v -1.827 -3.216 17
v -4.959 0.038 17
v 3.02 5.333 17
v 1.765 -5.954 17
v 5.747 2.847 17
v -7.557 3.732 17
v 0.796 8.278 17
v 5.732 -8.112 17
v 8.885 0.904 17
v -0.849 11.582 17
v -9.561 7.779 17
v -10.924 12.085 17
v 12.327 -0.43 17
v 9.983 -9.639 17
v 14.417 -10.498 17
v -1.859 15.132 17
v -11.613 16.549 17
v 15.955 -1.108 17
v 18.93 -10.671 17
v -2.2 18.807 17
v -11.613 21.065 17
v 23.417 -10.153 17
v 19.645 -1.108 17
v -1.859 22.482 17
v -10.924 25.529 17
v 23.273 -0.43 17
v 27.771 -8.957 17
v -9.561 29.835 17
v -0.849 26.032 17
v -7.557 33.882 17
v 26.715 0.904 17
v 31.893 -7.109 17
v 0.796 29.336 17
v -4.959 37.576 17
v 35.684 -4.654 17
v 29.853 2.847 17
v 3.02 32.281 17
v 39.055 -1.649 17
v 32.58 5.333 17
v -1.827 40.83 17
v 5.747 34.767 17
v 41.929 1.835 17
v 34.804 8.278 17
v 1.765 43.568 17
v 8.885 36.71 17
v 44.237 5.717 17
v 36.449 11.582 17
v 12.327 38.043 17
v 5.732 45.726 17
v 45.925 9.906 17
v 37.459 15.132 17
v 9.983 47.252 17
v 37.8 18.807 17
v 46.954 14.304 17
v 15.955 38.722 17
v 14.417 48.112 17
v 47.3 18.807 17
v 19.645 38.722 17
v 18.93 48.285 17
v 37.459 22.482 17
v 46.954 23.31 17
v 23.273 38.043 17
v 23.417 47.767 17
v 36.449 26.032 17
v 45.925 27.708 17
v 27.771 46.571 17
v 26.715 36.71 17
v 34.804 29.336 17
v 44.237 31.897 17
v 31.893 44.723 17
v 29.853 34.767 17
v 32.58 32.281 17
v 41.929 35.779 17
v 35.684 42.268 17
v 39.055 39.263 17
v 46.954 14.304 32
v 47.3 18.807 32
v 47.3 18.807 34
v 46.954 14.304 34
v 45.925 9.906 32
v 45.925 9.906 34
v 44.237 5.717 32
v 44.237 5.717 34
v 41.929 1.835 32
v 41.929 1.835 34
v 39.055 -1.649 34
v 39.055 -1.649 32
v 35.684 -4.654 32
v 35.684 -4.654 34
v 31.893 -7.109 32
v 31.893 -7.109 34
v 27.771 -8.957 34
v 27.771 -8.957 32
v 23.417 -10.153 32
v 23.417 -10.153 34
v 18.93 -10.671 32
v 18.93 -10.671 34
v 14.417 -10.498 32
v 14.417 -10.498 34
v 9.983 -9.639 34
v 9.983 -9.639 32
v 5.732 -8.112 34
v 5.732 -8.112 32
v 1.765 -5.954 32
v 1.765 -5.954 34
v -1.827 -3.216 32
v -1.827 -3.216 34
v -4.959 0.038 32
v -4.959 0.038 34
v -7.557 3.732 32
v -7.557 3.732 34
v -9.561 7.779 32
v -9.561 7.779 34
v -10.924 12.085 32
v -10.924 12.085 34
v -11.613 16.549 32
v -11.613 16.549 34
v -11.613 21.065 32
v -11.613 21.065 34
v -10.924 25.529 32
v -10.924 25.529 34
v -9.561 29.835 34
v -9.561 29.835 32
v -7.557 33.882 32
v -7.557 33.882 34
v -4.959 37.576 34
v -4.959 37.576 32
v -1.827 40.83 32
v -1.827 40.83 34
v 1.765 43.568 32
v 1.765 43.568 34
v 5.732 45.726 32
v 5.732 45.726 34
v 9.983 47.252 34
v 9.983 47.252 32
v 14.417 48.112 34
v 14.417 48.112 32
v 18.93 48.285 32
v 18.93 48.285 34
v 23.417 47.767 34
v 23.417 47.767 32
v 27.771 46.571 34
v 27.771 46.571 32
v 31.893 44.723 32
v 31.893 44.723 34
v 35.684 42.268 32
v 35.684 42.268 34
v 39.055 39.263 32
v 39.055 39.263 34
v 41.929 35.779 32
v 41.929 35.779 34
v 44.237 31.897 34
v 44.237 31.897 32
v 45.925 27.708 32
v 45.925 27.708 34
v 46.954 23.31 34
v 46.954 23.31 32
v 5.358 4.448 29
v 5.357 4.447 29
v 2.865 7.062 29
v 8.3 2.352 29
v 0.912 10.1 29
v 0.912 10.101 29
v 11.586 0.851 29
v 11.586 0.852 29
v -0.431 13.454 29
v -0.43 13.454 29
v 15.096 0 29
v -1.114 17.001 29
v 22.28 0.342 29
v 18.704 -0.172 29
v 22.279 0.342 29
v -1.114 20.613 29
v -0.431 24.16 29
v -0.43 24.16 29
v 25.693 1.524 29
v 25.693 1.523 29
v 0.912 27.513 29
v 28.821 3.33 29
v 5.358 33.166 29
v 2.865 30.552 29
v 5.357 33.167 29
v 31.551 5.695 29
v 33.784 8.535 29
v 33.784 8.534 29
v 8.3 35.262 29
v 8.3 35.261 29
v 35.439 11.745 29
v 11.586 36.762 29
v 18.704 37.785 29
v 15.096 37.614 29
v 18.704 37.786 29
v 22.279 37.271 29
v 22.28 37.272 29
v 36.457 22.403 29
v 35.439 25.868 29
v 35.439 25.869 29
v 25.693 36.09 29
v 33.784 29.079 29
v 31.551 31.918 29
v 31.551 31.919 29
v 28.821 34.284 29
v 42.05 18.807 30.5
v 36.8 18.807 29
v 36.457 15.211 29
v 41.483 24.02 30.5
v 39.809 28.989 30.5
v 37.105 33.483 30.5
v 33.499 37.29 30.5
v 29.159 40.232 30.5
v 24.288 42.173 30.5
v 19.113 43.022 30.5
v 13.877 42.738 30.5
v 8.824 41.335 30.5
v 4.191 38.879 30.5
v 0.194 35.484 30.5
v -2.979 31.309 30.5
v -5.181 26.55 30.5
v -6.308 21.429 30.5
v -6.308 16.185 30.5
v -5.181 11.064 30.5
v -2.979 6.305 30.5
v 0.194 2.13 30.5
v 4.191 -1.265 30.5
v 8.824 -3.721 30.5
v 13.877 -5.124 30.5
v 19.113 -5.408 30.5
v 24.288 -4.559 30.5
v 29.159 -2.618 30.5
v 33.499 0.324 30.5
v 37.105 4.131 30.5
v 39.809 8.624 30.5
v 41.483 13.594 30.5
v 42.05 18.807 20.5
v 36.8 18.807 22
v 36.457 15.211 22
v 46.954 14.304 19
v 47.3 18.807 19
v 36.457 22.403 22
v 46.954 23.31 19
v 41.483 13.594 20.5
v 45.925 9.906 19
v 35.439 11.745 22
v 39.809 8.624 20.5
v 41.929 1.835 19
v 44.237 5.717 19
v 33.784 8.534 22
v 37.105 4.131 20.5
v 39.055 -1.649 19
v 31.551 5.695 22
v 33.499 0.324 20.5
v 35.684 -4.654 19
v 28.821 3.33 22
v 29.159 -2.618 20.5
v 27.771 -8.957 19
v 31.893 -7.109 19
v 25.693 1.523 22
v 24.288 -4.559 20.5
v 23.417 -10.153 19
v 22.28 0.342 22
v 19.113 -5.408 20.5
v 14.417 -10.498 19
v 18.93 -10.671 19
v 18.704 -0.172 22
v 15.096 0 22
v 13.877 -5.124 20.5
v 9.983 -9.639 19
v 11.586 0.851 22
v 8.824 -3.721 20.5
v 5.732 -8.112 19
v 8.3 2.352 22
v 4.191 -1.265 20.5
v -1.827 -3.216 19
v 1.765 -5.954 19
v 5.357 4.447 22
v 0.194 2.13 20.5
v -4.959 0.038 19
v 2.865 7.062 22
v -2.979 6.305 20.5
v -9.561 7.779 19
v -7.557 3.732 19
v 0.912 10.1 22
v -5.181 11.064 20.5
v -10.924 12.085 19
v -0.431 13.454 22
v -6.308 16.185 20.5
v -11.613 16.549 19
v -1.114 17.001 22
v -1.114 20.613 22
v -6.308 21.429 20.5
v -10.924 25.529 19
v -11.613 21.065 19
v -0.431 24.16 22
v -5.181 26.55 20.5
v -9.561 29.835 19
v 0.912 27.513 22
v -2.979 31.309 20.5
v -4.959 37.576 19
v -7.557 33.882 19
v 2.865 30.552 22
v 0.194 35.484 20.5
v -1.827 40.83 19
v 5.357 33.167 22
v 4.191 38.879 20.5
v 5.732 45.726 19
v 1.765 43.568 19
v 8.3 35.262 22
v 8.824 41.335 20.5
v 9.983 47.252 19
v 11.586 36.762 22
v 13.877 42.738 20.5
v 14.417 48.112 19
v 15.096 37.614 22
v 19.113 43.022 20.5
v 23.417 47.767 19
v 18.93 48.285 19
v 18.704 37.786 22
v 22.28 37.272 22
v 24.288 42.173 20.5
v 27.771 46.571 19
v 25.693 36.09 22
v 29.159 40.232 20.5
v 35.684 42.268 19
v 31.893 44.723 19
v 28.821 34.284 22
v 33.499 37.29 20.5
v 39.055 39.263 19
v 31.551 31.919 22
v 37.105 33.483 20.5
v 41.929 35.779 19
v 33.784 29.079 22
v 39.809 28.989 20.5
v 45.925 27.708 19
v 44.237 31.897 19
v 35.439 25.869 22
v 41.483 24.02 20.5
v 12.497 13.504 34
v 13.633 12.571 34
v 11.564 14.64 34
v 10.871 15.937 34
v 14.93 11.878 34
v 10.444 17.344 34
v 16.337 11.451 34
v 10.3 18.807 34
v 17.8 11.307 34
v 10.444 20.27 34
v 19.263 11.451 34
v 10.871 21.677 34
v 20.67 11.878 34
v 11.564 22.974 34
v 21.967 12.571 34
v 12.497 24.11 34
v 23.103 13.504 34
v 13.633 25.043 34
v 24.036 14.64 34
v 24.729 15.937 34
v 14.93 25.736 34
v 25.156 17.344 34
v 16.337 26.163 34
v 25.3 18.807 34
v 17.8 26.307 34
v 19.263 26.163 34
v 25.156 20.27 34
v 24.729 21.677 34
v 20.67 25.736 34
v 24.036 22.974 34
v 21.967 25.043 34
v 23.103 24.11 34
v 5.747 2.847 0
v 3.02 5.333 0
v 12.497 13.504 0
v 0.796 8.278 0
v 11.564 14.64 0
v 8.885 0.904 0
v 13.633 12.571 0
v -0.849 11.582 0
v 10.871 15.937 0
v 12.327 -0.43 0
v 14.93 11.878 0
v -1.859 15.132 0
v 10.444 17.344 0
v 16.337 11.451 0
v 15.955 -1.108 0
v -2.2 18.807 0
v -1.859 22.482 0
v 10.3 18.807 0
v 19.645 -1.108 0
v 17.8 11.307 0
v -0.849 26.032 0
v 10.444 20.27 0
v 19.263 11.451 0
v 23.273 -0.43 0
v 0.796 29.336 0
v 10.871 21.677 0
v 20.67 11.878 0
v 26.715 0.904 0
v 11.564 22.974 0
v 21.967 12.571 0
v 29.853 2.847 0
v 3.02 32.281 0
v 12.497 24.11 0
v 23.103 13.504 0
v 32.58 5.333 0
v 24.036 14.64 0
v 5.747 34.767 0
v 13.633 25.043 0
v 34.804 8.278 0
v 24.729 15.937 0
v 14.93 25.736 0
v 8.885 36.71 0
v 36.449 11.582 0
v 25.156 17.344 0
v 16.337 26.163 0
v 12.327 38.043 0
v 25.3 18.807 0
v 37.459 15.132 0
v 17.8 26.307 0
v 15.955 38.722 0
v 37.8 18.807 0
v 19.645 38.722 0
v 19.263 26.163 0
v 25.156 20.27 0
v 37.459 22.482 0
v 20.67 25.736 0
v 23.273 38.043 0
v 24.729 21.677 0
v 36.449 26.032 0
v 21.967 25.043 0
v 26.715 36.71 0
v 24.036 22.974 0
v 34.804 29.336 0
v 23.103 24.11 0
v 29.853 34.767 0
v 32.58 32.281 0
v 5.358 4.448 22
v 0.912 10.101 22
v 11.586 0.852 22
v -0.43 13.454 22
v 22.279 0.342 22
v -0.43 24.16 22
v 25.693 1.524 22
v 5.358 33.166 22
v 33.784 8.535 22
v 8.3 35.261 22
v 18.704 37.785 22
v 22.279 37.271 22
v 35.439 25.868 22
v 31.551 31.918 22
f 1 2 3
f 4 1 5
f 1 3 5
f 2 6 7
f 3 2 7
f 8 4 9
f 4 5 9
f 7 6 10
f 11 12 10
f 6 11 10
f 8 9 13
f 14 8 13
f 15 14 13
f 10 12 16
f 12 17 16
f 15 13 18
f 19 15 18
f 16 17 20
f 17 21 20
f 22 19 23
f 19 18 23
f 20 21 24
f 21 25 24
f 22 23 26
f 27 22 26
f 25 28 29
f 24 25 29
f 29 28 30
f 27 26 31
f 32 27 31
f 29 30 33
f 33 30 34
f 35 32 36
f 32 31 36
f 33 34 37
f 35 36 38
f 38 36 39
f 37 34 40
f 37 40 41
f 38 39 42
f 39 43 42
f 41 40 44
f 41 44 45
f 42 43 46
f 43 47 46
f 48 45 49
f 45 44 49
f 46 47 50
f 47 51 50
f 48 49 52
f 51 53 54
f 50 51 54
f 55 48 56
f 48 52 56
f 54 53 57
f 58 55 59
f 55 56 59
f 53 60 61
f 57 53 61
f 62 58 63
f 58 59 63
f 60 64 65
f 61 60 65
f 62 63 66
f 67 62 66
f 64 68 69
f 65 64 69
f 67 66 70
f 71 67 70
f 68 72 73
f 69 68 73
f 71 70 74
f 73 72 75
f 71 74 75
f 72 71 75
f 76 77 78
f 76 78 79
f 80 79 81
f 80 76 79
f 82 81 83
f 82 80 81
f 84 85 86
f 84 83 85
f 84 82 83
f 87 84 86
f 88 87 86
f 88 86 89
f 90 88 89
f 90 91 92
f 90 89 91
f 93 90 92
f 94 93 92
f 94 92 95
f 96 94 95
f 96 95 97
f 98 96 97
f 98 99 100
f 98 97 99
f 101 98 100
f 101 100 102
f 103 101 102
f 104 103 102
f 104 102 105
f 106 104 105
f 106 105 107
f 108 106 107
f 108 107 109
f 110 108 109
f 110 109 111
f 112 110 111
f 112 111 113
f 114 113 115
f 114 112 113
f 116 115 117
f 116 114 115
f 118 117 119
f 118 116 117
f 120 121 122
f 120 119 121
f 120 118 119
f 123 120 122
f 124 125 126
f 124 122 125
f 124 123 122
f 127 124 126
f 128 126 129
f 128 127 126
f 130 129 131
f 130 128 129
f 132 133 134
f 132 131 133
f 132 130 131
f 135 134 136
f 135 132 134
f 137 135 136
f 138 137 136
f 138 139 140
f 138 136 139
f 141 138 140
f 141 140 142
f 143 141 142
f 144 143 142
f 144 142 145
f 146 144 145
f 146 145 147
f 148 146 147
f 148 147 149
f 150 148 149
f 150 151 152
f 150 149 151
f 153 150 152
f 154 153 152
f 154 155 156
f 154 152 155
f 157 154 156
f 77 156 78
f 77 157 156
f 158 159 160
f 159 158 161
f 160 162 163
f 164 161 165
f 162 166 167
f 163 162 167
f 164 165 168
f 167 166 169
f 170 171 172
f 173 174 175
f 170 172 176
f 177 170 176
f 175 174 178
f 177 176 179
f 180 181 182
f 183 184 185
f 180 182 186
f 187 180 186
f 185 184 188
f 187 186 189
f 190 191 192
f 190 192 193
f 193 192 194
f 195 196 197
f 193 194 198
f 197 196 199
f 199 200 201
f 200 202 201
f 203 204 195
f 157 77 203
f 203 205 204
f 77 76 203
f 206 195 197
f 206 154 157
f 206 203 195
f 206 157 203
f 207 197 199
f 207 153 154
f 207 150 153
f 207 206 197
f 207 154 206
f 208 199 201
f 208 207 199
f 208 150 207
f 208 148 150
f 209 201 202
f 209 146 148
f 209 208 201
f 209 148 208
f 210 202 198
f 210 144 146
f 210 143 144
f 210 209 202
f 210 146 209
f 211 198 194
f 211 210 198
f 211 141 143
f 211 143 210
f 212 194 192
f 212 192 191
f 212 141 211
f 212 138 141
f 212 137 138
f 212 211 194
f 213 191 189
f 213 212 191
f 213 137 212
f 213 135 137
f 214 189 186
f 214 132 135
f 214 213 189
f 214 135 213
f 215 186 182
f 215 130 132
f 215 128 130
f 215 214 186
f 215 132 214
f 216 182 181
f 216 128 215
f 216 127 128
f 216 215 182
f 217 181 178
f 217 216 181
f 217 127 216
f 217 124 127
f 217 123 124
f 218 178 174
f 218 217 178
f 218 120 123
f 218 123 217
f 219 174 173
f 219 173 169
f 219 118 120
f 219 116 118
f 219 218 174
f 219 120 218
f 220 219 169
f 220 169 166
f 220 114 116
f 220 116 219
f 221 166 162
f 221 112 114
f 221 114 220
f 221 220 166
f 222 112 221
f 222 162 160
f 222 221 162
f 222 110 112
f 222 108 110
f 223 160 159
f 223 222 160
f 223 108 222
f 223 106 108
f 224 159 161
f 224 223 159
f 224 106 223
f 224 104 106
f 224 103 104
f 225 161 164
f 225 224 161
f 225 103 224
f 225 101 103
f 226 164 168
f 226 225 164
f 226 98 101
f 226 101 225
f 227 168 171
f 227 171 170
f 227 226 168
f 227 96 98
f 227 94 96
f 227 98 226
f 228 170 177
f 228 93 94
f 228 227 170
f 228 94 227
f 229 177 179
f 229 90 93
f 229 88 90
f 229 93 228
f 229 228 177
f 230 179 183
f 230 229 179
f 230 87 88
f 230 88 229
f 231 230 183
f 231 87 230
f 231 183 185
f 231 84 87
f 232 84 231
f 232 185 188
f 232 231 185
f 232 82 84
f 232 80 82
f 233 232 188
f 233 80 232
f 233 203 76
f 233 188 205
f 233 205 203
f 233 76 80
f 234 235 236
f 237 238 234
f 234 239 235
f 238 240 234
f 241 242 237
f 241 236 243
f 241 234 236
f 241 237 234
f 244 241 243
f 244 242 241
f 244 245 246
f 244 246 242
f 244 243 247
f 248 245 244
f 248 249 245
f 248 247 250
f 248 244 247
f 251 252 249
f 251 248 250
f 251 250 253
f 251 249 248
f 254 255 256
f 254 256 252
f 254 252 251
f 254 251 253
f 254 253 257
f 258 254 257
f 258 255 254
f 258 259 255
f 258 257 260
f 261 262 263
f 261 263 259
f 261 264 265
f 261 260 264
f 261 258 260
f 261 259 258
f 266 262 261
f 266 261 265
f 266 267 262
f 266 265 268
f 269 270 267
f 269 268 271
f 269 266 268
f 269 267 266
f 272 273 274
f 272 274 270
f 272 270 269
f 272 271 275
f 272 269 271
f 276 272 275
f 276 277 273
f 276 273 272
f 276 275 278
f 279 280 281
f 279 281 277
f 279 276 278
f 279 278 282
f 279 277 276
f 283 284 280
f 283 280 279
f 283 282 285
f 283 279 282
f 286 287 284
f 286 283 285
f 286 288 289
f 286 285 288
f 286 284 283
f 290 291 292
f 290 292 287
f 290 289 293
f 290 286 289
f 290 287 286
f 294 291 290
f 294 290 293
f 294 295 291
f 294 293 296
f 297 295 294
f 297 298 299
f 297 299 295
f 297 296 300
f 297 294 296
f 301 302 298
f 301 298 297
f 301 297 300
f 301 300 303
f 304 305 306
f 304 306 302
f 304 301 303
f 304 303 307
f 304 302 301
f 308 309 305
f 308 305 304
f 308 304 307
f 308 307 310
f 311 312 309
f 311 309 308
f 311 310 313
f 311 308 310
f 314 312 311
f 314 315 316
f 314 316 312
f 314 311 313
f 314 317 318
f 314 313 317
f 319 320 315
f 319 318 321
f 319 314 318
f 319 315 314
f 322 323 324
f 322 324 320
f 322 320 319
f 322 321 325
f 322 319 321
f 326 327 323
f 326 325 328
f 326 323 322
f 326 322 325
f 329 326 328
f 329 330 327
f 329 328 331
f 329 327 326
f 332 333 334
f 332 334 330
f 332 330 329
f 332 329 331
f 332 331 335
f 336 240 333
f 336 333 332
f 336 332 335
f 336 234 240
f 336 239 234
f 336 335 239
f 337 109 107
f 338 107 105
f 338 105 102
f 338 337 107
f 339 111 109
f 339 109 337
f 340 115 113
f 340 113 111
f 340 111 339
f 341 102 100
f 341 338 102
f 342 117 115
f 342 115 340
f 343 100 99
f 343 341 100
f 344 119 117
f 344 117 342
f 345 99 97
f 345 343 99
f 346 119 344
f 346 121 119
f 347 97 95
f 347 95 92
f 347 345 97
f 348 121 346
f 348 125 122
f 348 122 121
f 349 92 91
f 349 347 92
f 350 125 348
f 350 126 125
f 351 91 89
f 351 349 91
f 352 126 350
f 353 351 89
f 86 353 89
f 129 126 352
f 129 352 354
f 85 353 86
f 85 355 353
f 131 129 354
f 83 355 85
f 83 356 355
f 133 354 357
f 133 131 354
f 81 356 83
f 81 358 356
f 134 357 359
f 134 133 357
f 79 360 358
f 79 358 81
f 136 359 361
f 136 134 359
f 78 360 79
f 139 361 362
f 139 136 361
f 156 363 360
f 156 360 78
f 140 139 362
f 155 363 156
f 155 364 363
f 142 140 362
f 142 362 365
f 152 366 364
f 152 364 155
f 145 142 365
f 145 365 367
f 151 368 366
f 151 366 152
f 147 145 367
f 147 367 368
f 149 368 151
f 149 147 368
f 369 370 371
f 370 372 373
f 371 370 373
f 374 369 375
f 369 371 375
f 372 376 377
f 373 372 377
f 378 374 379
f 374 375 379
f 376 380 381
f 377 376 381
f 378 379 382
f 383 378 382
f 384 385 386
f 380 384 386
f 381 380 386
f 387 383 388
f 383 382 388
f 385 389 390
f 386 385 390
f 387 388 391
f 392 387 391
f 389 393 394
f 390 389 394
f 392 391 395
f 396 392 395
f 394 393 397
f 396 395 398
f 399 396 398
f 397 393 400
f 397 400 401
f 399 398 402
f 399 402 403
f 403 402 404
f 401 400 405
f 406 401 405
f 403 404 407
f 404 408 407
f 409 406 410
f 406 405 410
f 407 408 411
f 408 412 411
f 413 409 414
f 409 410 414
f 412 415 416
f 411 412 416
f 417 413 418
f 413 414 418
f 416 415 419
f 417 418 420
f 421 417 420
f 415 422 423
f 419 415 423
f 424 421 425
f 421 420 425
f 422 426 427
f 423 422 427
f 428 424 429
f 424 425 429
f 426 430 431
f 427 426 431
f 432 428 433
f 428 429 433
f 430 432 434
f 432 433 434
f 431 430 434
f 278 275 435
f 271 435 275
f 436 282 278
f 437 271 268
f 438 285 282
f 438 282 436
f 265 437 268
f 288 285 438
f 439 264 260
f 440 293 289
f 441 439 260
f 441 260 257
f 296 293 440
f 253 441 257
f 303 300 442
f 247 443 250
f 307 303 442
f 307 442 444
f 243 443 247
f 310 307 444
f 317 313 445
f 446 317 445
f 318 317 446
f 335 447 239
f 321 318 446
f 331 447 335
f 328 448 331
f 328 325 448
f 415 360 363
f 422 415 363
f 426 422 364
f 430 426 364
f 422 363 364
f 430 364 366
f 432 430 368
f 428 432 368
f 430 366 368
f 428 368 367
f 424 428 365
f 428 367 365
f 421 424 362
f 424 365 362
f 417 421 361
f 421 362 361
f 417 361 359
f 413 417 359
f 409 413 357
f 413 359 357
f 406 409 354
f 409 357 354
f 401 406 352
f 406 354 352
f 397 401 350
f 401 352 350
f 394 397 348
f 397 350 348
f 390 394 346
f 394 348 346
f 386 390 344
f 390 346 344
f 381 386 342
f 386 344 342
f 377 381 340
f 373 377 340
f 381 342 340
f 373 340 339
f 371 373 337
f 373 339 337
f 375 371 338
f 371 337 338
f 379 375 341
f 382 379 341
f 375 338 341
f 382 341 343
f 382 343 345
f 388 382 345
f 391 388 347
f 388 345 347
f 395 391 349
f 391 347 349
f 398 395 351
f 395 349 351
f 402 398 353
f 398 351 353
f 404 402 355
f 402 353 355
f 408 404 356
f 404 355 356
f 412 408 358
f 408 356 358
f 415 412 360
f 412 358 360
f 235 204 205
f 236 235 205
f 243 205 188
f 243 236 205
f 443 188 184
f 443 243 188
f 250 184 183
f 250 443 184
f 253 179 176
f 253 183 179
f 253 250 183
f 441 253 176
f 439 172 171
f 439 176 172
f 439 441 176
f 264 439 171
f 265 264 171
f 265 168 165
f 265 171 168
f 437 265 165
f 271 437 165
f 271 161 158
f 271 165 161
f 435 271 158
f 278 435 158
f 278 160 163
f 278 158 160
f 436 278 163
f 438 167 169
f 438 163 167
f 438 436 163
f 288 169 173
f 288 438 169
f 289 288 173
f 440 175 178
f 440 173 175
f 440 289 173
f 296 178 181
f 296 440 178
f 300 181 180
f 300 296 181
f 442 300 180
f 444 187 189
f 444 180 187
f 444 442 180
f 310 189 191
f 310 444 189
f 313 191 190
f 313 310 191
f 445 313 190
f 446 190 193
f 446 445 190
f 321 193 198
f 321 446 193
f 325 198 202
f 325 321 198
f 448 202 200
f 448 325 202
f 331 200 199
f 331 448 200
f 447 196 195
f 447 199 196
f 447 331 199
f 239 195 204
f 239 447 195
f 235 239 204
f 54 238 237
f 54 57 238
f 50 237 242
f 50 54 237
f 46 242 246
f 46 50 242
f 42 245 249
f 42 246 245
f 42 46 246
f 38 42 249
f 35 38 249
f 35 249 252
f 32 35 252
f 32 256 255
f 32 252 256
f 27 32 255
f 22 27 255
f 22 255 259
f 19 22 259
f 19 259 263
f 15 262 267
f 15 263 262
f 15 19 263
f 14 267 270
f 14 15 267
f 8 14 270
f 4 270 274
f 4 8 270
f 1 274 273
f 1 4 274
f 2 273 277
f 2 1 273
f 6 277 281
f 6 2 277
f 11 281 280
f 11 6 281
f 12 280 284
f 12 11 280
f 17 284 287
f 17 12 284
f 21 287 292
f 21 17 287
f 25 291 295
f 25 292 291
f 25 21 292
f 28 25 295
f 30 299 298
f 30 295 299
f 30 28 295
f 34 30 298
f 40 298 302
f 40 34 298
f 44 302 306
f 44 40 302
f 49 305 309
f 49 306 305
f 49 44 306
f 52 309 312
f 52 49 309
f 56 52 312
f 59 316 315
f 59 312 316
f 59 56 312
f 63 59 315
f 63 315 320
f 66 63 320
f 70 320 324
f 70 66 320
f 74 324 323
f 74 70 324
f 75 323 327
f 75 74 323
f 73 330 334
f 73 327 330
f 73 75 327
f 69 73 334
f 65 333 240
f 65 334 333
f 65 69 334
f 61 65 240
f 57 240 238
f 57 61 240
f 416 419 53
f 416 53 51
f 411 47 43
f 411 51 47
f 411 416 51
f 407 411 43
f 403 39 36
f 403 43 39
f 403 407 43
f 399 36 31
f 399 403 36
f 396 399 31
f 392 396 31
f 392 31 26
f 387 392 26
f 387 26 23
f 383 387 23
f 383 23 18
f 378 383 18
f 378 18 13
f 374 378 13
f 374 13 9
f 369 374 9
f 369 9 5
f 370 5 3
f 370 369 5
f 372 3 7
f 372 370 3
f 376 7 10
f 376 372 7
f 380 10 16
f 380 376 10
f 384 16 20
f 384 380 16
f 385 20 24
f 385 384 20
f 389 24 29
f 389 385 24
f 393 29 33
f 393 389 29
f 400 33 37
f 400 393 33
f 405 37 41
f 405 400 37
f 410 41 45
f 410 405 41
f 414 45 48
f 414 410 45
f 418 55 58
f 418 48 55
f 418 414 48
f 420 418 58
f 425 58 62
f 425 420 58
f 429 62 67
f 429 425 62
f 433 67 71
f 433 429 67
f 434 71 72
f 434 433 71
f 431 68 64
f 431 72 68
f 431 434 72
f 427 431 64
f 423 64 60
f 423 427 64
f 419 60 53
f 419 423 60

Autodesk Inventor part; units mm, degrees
ref_plane "YZ Plane" through (0, 0, 0) normal (1, 0, 0) x (0, 1, 0)
ref_plane "XZ Plane" through (0, 0, 0) normal (0, 1, 0) x (-1, 0, 0)
ref_plane "XY Plane" through (0, 0, 0) normal (0, 0, 1) x (1, 0, 0)
sketch "Sketch1" plane through (0, 0, 0) normal (0, 0, 1) x (1, 0, 0)
  circle A0 centre (17.8, 18.8069) radius 20
  circle A1 centre (17.8, 18.8069) radius 7.5
  point P0 (0, 0)
  dimension "d0" = 40
  dimension "d1" = 15
extrude "Extrusion1" add sketch "Sketch1" along normal blind 17
sketch "Sketch2" plane through (17.8, 18.8069, 0) normal (0, 0, -1) x (-1, 0, 0)
  point P0 (17.8, -18.8069)
sketch "Sketch3" plane through (17.8, 18.8069, 17) normal (0, 0, 1) x (1, 0, 0)
  circle A0 centre (0, 0) radius 29.5
  point P0 (-17.8, -18.8069)
  dimension "d4" = 59
extrude "Extrusion2" add sketch "Sketch3" along normal blind 5
sketch "Sketch4" plane through (17.8, 18.8069, 17) normal (0, 0, -1) x (-1, 0, 0)
  circle A0 centre (0, 0) radius 8.6163
  point P0 (17.8, -18.8069)
sketch "Sketch5" plane through (17.8, 18.8069, 22) normal (0, 0, 1) x (1, 0, 0)
  circle A0 centre (0, 0) radius 7.5
  point P0 (-17.8, -18.8069)
extrude "Extrusion3" cut sketch "Sketch5" against normal blind 57.5
sketch "Sketch6" plane through (17.8, 18.8069, 17) normal (0, 0, -1) x (-1, 0, 0)
  point P0 (17.8, -18.8069)
sketch "Sketch7" plane through (17.8, 18.8069, 22) normal (0, 0, 1) x (1, 0, 0)
  point P0 (-17.8, -18.8069)
sketch "Sketch8" plane through (17.8, 18.8069, 22) normal (0, 0, 1) x (1, 0, 0)
  circle A0 centre (0, 0) radius 19
  point P0 (-17.8, -18.8069)
  dimension "d9" = 38
extrude "Extrusion4" add sketch "Sketch8" along normal blind 7
sketch "Sketch9" plane through (17.8, 18.8069, 29) normal (0, 0, 1) x (1, 0, 0)
  circle A0 centre (0, 0) radius 29.5
  point P0 (-17.8, -18.8069)
extrude "Extrusion5" add sketch "Sketch9" along normal blind 5
sketch "Sketch10" plane through (17.8, 18.8069, 22) normal (0, 0, -1) x (-1, 0, 0)
  circle A0 centre (0, 0) radius 7.5 projected
  circle A1 centre (0, 0) radius 7.5
  point P0 (17.8, -18.8069)
sketch "Sketch11" plane through (17.8, 18.8069, 34) normal (0, 0, 1) x (1, 0, 0)
  circle A0 centre (0, 0) radius 7.5
  point P0 (-17.8, -18.8069)
extrude "Extrusion6" cut sketch "Sketch11" against normal blind 76.5
chamfer "Chamfer1" distance 3 distance2 10.5 1 edges at (-11.7, 18.8069, 29) measured on face at (47.2043, 16.4331, 32.3333)
chamfer "Chamfer2" distance 3 distance2 10.5 1 edges at (-11.7, 18.8069, 22) measured on face at (47.2043, 16.4331, 20.3333)
properties part number "Polia"
